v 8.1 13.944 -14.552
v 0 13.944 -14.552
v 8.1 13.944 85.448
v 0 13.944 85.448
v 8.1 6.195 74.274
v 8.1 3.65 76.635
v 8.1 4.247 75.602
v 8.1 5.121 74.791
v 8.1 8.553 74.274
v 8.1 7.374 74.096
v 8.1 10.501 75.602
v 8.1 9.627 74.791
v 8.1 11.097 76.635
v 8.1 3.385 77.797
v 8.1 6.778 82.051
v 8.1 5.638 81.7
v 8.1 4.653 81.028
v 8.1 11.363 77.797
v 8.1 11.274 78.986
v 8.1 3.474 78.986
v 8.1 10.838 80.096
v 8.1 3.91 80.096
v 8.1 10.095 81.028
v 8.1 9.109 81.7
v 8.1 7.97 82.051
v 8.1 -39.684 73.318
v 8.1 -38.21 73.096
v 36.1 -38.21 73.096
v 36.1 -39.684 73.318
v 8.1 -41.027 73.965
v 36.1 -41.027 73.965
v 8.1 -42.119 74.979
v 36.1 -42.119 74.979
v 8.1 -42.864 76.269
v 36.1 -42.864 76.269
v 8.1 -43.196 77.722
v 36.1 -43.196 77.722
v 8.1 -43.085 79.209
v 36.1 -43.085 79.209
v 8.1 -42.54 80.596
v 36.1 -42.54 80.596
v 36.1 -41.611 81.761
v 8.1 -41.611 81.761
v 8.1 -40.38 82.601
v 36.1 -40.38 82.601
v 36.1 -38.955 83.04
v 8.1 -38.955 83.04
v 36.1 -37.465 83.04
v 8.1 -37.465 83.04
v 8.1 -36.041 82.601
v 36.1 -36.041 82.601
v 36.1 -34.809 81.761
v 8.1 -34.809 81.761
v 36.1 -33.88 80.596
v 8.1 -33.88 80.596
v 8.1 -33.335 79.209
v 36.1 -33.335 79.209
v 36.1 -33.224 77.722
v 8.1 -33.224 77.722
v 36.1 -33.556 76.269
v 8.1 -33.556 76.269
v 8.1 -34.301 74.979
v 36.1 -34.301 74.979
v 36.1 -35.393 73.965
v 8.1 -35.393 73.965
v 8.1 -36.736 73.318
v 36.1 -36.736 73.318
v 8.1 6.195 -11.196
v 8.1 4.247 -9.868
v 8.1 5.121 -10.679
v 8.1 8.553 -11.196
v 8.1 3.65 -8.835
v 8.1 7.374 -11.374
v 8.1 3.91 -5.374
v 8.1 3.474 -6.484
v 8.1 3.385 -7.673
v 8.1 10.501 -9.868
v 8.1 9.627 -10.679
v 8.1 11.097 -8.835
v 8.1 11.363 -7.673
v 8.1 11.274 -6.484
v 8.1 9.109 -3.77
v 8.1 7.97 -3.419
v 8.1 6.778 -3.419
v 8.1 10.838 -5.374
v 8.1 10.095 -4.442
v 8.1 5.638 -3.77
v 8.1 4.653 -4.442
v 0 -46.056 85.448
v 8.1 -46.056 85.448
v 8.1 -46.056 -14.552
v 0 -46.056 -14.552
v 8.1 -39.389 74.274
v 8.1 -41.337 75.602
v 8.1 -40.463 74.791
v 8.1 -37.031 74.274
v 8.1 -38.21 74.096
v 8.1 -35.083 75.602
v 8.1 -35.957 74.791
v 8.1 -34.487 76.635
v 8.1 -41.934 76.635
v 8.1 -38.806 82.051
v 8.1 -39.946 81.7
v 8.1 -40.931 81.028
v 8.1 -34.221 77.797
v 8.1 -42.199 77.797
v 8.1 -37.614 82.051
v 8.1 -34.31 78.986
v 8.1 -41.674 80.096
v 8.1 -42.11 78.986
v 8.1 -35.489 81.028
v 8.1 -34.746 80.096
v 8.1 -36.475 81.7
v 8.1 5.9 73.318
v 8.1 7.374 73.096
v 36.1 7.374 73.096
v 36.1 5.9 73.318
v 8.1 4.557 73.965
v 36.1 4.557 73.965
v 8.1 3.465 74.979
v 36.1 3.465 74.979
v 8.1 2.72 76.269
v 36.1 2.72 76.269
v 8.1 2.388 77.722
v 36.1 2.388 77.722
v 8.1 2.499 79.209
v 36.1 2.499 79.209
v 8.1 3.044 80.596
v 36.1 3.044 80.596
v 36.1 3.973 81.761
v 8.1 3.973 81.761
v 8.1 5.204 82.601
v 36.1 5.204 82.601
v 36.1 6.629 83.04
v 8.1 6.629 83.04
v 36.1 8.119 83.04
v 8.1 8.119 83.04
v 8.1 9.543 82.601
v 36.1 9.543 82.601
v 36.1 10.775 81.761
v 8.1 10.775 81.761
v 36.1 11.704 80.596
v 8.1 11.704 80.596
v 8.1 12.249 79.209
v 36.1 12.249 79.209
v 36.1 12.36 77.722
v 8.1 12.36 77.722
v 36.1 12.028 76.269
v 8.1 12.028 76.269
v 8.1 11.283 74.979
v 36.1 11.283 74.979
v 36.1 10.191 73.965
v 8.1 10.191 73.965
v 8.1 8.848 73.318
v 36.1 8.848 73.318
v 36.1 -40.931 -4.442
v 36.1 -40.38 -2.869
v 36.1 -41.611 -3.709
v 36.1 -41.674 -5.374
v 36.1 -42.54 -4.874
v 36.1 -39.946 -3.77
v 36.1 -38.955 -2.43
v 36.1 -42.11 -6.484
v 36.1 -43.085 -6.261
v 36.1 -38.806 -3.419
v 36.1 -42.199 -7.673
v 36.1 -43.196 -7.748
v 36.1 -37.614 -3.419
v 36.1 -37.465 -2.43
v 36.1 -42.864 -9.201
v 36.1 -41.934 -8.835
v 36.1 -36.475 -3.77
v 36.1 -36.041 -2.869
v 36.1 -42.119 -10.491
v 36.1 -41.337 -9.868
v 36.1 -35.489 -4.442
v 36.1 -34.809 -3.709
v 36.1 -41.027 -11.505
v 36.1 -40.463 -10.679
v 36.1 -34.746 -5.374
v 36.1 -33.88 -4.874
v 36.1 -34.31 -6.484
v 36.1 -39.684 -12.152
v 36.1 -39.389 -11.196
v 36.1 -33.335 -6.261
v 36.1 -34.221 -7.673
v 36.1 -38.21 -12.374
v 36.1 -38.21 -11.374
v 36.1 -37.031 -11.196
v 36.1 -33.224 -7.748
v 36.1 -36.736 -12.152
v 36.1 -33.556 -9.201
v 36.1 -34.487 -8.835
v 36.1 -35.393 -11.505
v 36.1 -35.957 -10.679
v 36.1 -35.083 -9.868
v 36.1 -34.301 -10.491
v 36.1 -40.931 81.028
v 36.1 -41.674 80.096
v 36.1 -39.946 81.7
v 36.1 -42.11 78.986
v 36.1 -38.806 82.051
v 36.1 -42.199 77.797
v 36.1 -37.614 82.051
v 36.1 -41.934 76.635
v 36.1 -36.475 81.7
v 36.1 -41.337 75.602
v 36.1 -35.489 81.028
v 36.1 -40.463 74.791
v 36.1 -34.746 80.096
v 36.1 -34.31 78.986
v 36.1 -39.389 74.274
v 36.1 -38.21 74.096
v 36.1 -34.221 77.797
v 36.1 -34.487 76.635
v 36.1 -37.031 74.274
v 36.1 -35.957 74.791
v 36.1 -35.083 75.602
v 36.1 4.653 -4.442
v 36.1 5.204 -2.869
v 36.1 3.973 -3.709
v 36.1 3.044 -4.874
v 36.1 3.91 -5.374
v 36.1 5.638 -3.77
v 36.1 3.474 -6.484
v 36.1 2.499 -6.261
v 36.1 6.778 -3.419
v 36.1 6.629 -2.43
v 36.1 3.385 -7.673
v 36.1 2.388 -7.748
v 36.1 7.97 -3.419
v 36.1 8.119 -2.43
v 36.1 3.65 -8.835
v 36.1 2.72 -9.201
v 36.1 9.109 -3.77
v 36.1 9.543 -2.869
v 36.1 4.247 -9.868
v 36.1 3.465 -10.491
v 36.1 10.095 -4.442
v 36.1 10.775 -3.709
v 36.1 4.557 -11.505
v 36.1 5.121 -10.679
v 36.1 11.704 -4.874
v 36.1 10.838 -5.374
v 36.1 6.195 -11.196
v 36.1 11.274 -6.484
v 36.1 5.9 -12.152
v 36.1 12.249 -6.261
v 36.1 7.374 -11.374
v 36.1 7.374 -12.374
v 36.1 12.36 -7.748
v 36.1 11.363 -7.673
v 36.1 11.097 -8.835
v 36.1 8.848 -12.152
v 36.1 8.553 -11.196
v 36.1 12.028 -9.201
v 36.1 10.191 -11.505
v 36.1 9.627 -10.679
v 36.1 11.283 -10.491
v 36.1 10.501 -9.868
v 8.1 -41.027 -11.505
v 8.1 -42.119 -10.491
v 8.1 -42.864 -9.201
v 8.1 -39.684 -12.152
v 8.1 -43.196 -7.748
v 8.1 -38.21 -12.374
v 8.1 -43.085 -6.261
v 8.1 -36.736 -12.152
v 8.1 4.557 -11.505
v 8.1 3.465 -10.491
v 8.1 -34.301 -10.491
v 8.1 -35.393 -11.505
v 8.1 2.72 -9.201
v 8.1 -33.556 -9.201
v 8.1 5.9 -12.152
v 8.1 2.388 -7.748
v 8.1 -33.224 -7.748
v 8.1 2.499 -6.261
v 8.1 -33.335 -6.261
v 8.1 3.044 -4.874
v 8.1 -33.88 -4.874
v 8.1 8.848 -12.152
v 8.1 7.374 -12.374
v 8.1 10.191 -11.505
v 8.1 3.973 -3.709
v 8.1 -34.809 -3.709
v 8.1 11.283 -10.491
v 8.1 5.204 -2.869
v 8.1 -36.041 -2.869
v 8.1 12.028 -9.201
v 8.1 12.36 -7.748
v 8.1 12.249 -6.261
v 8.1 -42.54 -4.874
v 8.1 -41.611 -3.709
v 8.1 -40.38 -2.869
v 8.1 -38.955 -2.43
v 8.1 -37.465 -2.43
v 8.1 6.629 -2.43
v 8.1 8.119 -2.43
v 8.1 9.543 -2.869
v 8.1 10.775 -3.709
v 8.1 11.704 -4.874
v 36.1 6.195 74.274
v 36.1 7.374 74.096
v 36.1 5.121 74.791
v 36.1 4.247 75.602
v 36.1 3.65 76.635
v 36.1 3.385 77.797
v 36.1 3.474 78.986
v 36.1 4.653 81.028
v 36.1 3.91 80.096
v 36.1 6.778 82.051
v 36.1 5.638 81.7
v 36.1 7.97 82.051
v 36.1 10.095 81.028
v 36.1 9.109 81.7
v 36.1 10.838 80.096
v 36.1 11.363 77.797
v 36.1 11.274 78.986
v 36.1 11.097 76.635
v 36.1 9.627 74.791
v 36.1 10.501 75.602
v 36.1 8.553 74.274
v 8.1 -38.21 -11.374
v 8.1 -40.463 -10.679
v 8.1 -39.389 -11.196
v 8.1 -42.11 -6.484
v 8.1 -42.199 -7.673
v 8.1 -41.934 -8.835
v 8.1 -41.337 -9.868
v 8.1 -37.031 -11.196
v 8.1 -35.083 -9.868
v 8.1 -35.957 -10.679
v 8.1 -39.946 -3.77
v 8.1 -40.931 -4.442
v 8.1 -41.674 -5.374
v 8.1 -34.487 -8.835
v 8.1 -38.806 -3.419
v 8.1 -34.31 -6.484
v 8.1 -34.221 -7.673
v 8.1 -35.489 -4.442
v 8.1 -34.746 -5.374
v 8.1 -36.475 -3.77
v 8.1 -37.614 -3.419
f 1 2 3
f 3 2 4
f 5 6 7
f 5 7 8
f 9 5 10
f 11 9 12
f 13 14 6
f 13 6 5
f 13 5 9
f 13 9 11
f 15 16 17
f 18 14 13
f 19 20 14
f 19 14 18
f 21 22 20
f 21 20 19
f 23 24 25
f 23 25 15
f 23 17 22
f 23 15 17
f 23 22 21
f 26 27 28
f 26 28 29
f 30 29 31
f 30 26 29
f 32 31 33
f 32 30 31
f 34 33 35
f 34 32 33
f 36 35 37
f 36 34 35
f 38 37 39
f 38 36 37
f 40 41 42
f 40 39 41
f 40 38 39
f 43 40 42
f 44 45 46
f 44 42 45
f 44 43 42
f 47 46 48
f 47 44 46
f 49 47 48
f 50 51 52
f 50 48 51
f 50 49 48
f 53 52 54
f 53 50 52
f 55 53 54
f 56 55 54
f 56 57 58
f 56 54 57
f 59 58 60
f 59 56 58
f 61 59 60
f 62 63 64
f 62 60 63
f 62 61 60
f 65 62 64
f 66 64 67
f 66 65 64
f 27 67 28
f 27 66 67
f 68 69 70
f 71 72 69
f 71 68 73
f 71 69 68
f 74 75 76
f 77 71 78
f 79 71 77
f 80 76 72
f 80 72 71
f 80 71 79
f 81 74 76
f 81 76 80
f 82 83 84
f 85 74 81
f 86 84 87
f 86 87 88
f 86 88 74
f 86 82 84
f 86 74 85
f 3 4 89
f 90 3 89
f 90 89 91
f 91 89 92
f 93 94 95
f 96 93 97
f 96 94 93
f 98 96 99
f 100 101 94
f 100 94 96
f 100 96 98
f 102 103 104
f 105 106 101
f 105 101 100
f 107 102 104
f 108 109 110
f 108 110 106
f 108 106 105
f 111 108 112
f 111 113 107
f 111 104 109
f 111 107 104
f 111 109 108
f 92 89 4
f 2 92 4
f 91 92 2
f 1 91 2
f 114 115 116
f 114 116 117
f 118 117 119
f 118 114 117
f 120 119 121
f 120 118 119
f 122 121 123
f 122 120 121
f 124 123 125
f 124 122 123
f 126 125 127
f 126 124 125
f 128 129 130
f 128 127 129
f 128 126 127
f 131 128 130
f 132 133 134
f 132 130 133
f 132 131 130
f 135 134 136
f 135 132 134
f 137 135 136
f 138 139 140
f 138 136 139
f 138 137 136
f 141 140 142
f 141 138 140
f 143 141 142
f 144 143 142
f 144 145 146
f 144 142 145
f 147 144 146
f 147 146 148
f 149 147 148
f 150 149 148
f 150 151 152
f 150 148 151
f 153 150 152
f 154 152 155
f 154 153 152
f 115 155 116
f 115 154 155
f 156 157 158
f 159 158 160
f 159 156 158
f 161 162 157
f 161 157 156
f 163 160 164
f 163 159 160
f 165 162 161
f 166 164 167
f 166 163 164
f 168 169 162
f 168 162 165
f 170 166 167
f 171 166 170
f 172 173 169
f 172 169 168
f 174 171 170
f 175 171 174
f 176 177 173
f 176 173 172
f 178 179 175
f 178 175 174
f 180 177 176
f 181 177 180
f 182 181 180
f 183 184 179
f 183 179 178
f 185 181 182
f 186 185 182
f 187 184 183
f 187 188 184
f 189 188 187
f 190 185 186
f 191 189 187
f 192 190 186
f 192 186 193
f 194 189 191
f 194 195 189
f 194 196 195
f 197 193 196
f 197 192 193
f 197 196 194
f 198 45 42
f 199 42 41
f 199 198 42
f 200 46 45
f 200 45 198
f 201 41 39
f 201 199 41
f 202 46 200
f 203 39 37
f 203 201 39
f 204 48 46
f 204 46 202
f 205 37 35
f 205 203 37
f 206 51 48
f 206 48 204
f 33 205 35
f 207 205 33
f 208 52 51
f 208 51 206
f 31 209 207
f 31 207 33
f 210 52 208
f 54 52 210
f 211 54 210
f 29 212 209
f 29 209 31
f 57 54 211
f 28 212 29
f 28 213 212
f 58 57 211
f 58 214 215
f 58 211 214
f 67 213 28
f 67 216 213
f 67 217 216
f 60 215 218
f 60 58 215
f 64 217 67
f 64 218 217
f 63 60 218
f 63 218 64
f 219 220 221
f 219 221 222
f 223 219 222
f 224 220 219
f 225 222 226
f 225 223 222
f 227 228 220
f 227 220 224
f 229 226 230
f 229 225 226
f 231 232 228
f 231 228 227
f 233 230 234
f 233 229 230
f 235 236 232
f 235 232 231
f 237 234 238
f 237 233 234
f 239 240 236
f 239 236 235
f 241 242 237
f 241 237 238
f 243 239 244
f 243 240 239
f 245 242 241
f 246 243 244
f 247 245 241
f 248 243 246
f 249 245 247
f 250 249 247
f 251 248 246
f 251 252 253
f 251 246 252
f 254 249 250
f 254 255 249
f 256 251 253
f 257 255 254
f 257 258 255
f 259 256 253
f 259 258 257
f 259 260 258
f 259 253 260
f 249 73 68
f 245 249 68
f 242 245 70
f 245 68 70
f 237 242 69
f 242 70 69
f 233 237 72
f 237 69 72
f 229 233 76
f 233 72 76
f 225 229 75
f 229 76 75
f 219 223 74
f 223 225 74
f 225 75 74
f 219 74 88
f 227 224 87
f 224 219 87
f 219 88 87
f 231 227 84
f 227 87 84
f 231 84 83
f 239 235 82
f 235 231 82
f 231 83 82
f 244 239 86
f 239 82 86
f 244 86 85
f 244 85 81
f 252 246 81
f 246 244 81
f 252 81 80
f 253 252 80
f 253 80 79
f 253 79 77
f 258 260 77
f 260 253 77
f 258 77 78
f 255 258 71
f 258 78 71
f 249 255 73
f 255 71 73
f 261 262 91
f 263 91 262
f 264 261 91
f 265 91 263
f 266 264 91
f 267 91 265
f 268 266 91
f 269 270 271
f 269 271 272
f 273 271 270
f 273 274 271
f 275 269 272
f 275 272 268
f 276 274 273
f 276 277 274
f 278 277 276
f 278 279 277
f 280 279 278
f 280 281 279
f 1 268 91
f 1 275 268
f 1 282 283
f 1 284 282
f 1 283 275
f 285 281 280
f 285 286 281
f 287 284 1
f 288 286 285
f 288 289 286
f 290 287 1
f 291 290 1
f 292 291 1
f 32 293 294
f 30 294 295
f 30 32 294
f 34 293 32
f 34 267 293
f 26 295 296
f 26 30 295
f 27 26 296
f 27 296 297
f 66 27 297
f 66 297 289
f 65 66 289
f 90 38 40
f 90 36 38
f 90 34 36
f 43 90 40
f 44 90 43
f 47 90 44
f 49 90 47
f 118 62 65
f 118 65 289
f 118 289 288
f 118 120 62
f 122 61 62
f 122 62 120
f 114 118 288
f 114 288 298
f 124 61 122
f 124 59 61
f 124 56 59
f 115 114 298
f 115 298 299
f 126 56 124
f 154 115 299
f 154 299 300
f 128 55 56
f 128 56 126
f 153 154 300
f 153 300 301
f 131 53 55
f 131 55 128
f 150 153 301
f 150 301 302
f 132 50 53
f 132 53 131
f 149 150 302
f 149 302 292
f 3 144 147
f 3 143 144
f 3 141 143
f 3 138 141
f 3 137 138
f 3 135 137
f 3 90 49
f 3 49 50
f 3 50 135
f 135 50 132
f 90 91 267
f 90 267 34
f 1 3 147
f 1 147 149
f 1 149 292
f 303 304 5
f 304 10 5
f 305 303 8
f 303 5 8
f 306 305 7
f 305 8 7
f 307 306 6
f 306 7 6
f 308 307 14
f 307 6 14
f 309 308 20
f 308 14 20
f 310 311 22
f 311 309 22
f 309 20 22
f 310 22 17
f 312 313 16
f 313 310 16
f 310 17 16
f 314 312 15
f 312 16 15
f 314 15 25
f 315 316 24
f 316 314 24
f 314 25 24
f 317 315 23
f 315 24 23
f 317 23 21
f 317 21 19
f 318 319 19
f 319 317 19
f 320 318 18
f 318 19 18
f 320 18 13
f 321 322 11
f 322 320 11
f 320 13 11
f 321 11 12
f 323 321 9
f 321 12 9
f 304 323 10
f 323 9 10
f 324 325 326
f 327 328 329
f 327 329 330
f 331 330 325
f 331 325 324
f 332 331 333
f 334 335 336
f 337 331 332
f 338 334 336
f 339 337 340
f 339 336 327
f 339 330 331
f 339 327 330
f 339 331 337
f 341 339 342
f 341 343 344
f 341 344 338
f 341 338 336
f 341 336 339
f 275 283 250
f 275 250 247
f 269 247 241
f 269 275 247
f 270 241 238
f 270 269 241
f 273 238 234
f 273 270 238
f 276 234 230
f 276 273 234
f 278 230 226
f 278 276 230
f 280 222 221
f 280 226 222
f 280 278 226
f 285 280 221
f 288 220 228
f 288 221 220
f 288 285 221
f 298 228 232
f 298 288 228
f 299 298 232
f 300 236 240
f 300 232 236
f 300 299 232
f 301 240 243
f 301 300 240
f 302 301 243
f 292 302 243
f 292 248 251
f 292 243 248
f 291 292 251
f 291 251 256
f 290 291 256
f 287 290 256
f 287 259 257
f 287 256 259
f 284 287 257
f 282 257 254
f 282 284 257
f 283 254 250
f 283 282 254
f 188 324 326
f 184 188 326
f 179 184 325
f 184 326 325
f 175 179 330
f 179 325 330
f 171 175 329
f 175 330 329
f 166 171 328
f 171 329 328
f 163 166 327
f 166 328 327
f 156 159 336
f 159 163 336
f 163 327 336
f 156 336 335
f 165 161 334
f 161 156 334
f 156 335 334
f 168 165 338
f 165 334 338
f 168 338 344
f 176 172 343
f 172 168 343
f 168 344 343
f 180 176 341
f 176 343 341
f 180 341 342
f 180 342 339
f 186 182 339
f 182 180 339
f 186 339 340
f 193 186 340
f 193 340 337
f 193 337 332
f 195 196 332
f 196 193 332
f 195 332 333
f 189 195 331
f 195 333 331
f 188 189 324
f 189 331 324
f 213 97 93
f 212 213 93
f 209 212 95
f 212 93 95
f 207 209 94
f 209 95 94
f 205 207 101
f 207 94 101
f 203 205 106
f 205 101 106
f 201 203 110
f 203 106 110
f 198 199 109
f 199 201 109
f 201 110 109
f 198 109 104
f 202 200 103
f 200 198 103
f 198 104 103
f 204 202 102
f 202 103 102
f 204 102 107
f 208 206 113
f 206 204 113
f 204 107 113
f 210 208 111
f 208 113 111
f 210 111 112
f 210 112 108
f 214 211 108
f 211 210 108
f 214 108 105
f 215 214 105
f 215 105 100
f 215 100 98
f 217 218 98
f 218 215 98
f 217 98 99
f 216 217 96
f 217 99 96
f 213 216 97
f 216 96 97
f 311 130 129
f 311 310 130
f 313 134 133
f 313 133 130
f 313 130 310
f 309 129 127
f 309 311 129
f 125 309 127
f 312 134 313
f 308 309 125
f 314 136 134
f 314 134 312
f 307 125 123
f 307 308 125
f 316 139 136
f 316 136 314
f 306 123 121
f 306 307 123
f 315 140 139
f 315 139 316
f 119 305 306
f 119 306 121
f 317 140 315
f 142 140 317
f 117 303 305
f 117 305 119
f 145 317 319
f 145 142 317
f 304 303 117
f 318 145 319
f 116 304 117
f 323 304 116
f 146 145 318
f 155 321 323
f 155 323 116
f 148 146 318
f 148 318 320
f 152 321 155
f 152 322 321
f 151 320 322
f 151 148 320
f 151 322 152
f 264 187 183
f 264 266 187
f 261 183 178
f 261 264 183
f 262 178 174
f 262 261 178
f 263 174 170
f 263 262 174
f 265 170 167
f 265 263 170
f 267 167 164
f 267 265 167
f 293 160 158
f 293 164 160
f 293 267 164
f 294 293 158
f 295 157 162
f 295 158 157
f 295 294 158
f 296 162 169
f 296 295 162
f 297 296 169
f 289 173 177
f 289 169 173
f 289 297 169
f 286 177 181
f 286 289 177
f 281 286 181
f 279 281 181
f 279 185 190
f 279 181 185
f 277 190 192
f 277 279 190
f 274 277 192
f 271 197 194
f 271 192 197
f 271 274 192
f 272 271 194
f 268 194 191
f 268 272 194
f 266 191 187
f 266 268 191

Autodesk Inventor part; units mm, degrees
ref_plane "YZ Plane" through (0, 0, 0) normal (1, 0, 0) x (0, 1, 0)
ref_plane "XZ Plane" through (0, 0, 0) normal (0, 1, 0) x (-1, 0, 0)
ref_plane "XY Plane" through (0, 0, 0) normal (0, 0, 1) x (1, 0, 0)
sketch "スケッチ1" plane through (0, 0, 0) normal (1, 0, 0) x (0, 1, 0)
  line L0 (13.9438, 85.4482) -> (-46.0562, 85.4482)
  line L1 (-46.0562, 85.4482) -> (-46.0562, -14.5518)
  line L2 (-46.0562, -14.5518) -> (13.9438, -14.5518)
  line L3 (13.9438, -14.5518) -> (13.9438, 85.4482)
  point P0 (0, 0)
  dimension "d0" = 60
  dimension "d1" = 100
extrude "押し出し1" add sketch "スケッチ1" along normal blind 8.1
sketch "スケッチ2" plane through (8.1, 0, 0) normal (1, 0, 0) x (0, 0, -1)
  circle A0 centre (-78.096, 7.3739) radius 5
  circle A1 centre (-78.096, -38.2101) radius 5
  circle A2 centre (7.3739, -38.2101) radius 5
  circle A3 centre (7.3739, 7.3739) radius 5
  circle A4 centre (-78.096, 7.3739) radius 4
  circle A5 centre (-78.096, -38.2101) radius 4
  circle A6 centre (7.3739, 7.3739) radius 4
  circle A7 centre (7.3739, -38.2101) radius 4
  point P0 (0, 0)
  dimension "d4" = 10
  dimension "d5" = 10
  dimension "d6" = 10
  dimension "d7" = 10
  dimension "d8" = 8
  dimension "d9" = 8
  dimension "d10" = 8
  dimension "d11" = 8
extrude "押し出し2" add sketch "スケッチ2" along normal blind 28
sketch "スケッチ3" plane through (0, 0, 0) normal (-1, 0, 0) x (0, 0, 1)
  point P0 (0, 0)
equation "\"BendRadius\" = Thickness"
equation "\"BendReliefWidth\" = Thickness"
equation "\"BendReliefDepth\" = 0.5 * Thickness"
equation "\"CornerReliefSize\" = 4 * Thickness"
equation "\"MinimumRemnant\" = 2 * Thickness"
equation "\"TransitionRadius\" = BendRadius"
equation "\"JacobiRadiusSize\" = BendRadius"
equation "\"GapSize\" = Thickness"
equation "\"Thickness\" = 0.5"
